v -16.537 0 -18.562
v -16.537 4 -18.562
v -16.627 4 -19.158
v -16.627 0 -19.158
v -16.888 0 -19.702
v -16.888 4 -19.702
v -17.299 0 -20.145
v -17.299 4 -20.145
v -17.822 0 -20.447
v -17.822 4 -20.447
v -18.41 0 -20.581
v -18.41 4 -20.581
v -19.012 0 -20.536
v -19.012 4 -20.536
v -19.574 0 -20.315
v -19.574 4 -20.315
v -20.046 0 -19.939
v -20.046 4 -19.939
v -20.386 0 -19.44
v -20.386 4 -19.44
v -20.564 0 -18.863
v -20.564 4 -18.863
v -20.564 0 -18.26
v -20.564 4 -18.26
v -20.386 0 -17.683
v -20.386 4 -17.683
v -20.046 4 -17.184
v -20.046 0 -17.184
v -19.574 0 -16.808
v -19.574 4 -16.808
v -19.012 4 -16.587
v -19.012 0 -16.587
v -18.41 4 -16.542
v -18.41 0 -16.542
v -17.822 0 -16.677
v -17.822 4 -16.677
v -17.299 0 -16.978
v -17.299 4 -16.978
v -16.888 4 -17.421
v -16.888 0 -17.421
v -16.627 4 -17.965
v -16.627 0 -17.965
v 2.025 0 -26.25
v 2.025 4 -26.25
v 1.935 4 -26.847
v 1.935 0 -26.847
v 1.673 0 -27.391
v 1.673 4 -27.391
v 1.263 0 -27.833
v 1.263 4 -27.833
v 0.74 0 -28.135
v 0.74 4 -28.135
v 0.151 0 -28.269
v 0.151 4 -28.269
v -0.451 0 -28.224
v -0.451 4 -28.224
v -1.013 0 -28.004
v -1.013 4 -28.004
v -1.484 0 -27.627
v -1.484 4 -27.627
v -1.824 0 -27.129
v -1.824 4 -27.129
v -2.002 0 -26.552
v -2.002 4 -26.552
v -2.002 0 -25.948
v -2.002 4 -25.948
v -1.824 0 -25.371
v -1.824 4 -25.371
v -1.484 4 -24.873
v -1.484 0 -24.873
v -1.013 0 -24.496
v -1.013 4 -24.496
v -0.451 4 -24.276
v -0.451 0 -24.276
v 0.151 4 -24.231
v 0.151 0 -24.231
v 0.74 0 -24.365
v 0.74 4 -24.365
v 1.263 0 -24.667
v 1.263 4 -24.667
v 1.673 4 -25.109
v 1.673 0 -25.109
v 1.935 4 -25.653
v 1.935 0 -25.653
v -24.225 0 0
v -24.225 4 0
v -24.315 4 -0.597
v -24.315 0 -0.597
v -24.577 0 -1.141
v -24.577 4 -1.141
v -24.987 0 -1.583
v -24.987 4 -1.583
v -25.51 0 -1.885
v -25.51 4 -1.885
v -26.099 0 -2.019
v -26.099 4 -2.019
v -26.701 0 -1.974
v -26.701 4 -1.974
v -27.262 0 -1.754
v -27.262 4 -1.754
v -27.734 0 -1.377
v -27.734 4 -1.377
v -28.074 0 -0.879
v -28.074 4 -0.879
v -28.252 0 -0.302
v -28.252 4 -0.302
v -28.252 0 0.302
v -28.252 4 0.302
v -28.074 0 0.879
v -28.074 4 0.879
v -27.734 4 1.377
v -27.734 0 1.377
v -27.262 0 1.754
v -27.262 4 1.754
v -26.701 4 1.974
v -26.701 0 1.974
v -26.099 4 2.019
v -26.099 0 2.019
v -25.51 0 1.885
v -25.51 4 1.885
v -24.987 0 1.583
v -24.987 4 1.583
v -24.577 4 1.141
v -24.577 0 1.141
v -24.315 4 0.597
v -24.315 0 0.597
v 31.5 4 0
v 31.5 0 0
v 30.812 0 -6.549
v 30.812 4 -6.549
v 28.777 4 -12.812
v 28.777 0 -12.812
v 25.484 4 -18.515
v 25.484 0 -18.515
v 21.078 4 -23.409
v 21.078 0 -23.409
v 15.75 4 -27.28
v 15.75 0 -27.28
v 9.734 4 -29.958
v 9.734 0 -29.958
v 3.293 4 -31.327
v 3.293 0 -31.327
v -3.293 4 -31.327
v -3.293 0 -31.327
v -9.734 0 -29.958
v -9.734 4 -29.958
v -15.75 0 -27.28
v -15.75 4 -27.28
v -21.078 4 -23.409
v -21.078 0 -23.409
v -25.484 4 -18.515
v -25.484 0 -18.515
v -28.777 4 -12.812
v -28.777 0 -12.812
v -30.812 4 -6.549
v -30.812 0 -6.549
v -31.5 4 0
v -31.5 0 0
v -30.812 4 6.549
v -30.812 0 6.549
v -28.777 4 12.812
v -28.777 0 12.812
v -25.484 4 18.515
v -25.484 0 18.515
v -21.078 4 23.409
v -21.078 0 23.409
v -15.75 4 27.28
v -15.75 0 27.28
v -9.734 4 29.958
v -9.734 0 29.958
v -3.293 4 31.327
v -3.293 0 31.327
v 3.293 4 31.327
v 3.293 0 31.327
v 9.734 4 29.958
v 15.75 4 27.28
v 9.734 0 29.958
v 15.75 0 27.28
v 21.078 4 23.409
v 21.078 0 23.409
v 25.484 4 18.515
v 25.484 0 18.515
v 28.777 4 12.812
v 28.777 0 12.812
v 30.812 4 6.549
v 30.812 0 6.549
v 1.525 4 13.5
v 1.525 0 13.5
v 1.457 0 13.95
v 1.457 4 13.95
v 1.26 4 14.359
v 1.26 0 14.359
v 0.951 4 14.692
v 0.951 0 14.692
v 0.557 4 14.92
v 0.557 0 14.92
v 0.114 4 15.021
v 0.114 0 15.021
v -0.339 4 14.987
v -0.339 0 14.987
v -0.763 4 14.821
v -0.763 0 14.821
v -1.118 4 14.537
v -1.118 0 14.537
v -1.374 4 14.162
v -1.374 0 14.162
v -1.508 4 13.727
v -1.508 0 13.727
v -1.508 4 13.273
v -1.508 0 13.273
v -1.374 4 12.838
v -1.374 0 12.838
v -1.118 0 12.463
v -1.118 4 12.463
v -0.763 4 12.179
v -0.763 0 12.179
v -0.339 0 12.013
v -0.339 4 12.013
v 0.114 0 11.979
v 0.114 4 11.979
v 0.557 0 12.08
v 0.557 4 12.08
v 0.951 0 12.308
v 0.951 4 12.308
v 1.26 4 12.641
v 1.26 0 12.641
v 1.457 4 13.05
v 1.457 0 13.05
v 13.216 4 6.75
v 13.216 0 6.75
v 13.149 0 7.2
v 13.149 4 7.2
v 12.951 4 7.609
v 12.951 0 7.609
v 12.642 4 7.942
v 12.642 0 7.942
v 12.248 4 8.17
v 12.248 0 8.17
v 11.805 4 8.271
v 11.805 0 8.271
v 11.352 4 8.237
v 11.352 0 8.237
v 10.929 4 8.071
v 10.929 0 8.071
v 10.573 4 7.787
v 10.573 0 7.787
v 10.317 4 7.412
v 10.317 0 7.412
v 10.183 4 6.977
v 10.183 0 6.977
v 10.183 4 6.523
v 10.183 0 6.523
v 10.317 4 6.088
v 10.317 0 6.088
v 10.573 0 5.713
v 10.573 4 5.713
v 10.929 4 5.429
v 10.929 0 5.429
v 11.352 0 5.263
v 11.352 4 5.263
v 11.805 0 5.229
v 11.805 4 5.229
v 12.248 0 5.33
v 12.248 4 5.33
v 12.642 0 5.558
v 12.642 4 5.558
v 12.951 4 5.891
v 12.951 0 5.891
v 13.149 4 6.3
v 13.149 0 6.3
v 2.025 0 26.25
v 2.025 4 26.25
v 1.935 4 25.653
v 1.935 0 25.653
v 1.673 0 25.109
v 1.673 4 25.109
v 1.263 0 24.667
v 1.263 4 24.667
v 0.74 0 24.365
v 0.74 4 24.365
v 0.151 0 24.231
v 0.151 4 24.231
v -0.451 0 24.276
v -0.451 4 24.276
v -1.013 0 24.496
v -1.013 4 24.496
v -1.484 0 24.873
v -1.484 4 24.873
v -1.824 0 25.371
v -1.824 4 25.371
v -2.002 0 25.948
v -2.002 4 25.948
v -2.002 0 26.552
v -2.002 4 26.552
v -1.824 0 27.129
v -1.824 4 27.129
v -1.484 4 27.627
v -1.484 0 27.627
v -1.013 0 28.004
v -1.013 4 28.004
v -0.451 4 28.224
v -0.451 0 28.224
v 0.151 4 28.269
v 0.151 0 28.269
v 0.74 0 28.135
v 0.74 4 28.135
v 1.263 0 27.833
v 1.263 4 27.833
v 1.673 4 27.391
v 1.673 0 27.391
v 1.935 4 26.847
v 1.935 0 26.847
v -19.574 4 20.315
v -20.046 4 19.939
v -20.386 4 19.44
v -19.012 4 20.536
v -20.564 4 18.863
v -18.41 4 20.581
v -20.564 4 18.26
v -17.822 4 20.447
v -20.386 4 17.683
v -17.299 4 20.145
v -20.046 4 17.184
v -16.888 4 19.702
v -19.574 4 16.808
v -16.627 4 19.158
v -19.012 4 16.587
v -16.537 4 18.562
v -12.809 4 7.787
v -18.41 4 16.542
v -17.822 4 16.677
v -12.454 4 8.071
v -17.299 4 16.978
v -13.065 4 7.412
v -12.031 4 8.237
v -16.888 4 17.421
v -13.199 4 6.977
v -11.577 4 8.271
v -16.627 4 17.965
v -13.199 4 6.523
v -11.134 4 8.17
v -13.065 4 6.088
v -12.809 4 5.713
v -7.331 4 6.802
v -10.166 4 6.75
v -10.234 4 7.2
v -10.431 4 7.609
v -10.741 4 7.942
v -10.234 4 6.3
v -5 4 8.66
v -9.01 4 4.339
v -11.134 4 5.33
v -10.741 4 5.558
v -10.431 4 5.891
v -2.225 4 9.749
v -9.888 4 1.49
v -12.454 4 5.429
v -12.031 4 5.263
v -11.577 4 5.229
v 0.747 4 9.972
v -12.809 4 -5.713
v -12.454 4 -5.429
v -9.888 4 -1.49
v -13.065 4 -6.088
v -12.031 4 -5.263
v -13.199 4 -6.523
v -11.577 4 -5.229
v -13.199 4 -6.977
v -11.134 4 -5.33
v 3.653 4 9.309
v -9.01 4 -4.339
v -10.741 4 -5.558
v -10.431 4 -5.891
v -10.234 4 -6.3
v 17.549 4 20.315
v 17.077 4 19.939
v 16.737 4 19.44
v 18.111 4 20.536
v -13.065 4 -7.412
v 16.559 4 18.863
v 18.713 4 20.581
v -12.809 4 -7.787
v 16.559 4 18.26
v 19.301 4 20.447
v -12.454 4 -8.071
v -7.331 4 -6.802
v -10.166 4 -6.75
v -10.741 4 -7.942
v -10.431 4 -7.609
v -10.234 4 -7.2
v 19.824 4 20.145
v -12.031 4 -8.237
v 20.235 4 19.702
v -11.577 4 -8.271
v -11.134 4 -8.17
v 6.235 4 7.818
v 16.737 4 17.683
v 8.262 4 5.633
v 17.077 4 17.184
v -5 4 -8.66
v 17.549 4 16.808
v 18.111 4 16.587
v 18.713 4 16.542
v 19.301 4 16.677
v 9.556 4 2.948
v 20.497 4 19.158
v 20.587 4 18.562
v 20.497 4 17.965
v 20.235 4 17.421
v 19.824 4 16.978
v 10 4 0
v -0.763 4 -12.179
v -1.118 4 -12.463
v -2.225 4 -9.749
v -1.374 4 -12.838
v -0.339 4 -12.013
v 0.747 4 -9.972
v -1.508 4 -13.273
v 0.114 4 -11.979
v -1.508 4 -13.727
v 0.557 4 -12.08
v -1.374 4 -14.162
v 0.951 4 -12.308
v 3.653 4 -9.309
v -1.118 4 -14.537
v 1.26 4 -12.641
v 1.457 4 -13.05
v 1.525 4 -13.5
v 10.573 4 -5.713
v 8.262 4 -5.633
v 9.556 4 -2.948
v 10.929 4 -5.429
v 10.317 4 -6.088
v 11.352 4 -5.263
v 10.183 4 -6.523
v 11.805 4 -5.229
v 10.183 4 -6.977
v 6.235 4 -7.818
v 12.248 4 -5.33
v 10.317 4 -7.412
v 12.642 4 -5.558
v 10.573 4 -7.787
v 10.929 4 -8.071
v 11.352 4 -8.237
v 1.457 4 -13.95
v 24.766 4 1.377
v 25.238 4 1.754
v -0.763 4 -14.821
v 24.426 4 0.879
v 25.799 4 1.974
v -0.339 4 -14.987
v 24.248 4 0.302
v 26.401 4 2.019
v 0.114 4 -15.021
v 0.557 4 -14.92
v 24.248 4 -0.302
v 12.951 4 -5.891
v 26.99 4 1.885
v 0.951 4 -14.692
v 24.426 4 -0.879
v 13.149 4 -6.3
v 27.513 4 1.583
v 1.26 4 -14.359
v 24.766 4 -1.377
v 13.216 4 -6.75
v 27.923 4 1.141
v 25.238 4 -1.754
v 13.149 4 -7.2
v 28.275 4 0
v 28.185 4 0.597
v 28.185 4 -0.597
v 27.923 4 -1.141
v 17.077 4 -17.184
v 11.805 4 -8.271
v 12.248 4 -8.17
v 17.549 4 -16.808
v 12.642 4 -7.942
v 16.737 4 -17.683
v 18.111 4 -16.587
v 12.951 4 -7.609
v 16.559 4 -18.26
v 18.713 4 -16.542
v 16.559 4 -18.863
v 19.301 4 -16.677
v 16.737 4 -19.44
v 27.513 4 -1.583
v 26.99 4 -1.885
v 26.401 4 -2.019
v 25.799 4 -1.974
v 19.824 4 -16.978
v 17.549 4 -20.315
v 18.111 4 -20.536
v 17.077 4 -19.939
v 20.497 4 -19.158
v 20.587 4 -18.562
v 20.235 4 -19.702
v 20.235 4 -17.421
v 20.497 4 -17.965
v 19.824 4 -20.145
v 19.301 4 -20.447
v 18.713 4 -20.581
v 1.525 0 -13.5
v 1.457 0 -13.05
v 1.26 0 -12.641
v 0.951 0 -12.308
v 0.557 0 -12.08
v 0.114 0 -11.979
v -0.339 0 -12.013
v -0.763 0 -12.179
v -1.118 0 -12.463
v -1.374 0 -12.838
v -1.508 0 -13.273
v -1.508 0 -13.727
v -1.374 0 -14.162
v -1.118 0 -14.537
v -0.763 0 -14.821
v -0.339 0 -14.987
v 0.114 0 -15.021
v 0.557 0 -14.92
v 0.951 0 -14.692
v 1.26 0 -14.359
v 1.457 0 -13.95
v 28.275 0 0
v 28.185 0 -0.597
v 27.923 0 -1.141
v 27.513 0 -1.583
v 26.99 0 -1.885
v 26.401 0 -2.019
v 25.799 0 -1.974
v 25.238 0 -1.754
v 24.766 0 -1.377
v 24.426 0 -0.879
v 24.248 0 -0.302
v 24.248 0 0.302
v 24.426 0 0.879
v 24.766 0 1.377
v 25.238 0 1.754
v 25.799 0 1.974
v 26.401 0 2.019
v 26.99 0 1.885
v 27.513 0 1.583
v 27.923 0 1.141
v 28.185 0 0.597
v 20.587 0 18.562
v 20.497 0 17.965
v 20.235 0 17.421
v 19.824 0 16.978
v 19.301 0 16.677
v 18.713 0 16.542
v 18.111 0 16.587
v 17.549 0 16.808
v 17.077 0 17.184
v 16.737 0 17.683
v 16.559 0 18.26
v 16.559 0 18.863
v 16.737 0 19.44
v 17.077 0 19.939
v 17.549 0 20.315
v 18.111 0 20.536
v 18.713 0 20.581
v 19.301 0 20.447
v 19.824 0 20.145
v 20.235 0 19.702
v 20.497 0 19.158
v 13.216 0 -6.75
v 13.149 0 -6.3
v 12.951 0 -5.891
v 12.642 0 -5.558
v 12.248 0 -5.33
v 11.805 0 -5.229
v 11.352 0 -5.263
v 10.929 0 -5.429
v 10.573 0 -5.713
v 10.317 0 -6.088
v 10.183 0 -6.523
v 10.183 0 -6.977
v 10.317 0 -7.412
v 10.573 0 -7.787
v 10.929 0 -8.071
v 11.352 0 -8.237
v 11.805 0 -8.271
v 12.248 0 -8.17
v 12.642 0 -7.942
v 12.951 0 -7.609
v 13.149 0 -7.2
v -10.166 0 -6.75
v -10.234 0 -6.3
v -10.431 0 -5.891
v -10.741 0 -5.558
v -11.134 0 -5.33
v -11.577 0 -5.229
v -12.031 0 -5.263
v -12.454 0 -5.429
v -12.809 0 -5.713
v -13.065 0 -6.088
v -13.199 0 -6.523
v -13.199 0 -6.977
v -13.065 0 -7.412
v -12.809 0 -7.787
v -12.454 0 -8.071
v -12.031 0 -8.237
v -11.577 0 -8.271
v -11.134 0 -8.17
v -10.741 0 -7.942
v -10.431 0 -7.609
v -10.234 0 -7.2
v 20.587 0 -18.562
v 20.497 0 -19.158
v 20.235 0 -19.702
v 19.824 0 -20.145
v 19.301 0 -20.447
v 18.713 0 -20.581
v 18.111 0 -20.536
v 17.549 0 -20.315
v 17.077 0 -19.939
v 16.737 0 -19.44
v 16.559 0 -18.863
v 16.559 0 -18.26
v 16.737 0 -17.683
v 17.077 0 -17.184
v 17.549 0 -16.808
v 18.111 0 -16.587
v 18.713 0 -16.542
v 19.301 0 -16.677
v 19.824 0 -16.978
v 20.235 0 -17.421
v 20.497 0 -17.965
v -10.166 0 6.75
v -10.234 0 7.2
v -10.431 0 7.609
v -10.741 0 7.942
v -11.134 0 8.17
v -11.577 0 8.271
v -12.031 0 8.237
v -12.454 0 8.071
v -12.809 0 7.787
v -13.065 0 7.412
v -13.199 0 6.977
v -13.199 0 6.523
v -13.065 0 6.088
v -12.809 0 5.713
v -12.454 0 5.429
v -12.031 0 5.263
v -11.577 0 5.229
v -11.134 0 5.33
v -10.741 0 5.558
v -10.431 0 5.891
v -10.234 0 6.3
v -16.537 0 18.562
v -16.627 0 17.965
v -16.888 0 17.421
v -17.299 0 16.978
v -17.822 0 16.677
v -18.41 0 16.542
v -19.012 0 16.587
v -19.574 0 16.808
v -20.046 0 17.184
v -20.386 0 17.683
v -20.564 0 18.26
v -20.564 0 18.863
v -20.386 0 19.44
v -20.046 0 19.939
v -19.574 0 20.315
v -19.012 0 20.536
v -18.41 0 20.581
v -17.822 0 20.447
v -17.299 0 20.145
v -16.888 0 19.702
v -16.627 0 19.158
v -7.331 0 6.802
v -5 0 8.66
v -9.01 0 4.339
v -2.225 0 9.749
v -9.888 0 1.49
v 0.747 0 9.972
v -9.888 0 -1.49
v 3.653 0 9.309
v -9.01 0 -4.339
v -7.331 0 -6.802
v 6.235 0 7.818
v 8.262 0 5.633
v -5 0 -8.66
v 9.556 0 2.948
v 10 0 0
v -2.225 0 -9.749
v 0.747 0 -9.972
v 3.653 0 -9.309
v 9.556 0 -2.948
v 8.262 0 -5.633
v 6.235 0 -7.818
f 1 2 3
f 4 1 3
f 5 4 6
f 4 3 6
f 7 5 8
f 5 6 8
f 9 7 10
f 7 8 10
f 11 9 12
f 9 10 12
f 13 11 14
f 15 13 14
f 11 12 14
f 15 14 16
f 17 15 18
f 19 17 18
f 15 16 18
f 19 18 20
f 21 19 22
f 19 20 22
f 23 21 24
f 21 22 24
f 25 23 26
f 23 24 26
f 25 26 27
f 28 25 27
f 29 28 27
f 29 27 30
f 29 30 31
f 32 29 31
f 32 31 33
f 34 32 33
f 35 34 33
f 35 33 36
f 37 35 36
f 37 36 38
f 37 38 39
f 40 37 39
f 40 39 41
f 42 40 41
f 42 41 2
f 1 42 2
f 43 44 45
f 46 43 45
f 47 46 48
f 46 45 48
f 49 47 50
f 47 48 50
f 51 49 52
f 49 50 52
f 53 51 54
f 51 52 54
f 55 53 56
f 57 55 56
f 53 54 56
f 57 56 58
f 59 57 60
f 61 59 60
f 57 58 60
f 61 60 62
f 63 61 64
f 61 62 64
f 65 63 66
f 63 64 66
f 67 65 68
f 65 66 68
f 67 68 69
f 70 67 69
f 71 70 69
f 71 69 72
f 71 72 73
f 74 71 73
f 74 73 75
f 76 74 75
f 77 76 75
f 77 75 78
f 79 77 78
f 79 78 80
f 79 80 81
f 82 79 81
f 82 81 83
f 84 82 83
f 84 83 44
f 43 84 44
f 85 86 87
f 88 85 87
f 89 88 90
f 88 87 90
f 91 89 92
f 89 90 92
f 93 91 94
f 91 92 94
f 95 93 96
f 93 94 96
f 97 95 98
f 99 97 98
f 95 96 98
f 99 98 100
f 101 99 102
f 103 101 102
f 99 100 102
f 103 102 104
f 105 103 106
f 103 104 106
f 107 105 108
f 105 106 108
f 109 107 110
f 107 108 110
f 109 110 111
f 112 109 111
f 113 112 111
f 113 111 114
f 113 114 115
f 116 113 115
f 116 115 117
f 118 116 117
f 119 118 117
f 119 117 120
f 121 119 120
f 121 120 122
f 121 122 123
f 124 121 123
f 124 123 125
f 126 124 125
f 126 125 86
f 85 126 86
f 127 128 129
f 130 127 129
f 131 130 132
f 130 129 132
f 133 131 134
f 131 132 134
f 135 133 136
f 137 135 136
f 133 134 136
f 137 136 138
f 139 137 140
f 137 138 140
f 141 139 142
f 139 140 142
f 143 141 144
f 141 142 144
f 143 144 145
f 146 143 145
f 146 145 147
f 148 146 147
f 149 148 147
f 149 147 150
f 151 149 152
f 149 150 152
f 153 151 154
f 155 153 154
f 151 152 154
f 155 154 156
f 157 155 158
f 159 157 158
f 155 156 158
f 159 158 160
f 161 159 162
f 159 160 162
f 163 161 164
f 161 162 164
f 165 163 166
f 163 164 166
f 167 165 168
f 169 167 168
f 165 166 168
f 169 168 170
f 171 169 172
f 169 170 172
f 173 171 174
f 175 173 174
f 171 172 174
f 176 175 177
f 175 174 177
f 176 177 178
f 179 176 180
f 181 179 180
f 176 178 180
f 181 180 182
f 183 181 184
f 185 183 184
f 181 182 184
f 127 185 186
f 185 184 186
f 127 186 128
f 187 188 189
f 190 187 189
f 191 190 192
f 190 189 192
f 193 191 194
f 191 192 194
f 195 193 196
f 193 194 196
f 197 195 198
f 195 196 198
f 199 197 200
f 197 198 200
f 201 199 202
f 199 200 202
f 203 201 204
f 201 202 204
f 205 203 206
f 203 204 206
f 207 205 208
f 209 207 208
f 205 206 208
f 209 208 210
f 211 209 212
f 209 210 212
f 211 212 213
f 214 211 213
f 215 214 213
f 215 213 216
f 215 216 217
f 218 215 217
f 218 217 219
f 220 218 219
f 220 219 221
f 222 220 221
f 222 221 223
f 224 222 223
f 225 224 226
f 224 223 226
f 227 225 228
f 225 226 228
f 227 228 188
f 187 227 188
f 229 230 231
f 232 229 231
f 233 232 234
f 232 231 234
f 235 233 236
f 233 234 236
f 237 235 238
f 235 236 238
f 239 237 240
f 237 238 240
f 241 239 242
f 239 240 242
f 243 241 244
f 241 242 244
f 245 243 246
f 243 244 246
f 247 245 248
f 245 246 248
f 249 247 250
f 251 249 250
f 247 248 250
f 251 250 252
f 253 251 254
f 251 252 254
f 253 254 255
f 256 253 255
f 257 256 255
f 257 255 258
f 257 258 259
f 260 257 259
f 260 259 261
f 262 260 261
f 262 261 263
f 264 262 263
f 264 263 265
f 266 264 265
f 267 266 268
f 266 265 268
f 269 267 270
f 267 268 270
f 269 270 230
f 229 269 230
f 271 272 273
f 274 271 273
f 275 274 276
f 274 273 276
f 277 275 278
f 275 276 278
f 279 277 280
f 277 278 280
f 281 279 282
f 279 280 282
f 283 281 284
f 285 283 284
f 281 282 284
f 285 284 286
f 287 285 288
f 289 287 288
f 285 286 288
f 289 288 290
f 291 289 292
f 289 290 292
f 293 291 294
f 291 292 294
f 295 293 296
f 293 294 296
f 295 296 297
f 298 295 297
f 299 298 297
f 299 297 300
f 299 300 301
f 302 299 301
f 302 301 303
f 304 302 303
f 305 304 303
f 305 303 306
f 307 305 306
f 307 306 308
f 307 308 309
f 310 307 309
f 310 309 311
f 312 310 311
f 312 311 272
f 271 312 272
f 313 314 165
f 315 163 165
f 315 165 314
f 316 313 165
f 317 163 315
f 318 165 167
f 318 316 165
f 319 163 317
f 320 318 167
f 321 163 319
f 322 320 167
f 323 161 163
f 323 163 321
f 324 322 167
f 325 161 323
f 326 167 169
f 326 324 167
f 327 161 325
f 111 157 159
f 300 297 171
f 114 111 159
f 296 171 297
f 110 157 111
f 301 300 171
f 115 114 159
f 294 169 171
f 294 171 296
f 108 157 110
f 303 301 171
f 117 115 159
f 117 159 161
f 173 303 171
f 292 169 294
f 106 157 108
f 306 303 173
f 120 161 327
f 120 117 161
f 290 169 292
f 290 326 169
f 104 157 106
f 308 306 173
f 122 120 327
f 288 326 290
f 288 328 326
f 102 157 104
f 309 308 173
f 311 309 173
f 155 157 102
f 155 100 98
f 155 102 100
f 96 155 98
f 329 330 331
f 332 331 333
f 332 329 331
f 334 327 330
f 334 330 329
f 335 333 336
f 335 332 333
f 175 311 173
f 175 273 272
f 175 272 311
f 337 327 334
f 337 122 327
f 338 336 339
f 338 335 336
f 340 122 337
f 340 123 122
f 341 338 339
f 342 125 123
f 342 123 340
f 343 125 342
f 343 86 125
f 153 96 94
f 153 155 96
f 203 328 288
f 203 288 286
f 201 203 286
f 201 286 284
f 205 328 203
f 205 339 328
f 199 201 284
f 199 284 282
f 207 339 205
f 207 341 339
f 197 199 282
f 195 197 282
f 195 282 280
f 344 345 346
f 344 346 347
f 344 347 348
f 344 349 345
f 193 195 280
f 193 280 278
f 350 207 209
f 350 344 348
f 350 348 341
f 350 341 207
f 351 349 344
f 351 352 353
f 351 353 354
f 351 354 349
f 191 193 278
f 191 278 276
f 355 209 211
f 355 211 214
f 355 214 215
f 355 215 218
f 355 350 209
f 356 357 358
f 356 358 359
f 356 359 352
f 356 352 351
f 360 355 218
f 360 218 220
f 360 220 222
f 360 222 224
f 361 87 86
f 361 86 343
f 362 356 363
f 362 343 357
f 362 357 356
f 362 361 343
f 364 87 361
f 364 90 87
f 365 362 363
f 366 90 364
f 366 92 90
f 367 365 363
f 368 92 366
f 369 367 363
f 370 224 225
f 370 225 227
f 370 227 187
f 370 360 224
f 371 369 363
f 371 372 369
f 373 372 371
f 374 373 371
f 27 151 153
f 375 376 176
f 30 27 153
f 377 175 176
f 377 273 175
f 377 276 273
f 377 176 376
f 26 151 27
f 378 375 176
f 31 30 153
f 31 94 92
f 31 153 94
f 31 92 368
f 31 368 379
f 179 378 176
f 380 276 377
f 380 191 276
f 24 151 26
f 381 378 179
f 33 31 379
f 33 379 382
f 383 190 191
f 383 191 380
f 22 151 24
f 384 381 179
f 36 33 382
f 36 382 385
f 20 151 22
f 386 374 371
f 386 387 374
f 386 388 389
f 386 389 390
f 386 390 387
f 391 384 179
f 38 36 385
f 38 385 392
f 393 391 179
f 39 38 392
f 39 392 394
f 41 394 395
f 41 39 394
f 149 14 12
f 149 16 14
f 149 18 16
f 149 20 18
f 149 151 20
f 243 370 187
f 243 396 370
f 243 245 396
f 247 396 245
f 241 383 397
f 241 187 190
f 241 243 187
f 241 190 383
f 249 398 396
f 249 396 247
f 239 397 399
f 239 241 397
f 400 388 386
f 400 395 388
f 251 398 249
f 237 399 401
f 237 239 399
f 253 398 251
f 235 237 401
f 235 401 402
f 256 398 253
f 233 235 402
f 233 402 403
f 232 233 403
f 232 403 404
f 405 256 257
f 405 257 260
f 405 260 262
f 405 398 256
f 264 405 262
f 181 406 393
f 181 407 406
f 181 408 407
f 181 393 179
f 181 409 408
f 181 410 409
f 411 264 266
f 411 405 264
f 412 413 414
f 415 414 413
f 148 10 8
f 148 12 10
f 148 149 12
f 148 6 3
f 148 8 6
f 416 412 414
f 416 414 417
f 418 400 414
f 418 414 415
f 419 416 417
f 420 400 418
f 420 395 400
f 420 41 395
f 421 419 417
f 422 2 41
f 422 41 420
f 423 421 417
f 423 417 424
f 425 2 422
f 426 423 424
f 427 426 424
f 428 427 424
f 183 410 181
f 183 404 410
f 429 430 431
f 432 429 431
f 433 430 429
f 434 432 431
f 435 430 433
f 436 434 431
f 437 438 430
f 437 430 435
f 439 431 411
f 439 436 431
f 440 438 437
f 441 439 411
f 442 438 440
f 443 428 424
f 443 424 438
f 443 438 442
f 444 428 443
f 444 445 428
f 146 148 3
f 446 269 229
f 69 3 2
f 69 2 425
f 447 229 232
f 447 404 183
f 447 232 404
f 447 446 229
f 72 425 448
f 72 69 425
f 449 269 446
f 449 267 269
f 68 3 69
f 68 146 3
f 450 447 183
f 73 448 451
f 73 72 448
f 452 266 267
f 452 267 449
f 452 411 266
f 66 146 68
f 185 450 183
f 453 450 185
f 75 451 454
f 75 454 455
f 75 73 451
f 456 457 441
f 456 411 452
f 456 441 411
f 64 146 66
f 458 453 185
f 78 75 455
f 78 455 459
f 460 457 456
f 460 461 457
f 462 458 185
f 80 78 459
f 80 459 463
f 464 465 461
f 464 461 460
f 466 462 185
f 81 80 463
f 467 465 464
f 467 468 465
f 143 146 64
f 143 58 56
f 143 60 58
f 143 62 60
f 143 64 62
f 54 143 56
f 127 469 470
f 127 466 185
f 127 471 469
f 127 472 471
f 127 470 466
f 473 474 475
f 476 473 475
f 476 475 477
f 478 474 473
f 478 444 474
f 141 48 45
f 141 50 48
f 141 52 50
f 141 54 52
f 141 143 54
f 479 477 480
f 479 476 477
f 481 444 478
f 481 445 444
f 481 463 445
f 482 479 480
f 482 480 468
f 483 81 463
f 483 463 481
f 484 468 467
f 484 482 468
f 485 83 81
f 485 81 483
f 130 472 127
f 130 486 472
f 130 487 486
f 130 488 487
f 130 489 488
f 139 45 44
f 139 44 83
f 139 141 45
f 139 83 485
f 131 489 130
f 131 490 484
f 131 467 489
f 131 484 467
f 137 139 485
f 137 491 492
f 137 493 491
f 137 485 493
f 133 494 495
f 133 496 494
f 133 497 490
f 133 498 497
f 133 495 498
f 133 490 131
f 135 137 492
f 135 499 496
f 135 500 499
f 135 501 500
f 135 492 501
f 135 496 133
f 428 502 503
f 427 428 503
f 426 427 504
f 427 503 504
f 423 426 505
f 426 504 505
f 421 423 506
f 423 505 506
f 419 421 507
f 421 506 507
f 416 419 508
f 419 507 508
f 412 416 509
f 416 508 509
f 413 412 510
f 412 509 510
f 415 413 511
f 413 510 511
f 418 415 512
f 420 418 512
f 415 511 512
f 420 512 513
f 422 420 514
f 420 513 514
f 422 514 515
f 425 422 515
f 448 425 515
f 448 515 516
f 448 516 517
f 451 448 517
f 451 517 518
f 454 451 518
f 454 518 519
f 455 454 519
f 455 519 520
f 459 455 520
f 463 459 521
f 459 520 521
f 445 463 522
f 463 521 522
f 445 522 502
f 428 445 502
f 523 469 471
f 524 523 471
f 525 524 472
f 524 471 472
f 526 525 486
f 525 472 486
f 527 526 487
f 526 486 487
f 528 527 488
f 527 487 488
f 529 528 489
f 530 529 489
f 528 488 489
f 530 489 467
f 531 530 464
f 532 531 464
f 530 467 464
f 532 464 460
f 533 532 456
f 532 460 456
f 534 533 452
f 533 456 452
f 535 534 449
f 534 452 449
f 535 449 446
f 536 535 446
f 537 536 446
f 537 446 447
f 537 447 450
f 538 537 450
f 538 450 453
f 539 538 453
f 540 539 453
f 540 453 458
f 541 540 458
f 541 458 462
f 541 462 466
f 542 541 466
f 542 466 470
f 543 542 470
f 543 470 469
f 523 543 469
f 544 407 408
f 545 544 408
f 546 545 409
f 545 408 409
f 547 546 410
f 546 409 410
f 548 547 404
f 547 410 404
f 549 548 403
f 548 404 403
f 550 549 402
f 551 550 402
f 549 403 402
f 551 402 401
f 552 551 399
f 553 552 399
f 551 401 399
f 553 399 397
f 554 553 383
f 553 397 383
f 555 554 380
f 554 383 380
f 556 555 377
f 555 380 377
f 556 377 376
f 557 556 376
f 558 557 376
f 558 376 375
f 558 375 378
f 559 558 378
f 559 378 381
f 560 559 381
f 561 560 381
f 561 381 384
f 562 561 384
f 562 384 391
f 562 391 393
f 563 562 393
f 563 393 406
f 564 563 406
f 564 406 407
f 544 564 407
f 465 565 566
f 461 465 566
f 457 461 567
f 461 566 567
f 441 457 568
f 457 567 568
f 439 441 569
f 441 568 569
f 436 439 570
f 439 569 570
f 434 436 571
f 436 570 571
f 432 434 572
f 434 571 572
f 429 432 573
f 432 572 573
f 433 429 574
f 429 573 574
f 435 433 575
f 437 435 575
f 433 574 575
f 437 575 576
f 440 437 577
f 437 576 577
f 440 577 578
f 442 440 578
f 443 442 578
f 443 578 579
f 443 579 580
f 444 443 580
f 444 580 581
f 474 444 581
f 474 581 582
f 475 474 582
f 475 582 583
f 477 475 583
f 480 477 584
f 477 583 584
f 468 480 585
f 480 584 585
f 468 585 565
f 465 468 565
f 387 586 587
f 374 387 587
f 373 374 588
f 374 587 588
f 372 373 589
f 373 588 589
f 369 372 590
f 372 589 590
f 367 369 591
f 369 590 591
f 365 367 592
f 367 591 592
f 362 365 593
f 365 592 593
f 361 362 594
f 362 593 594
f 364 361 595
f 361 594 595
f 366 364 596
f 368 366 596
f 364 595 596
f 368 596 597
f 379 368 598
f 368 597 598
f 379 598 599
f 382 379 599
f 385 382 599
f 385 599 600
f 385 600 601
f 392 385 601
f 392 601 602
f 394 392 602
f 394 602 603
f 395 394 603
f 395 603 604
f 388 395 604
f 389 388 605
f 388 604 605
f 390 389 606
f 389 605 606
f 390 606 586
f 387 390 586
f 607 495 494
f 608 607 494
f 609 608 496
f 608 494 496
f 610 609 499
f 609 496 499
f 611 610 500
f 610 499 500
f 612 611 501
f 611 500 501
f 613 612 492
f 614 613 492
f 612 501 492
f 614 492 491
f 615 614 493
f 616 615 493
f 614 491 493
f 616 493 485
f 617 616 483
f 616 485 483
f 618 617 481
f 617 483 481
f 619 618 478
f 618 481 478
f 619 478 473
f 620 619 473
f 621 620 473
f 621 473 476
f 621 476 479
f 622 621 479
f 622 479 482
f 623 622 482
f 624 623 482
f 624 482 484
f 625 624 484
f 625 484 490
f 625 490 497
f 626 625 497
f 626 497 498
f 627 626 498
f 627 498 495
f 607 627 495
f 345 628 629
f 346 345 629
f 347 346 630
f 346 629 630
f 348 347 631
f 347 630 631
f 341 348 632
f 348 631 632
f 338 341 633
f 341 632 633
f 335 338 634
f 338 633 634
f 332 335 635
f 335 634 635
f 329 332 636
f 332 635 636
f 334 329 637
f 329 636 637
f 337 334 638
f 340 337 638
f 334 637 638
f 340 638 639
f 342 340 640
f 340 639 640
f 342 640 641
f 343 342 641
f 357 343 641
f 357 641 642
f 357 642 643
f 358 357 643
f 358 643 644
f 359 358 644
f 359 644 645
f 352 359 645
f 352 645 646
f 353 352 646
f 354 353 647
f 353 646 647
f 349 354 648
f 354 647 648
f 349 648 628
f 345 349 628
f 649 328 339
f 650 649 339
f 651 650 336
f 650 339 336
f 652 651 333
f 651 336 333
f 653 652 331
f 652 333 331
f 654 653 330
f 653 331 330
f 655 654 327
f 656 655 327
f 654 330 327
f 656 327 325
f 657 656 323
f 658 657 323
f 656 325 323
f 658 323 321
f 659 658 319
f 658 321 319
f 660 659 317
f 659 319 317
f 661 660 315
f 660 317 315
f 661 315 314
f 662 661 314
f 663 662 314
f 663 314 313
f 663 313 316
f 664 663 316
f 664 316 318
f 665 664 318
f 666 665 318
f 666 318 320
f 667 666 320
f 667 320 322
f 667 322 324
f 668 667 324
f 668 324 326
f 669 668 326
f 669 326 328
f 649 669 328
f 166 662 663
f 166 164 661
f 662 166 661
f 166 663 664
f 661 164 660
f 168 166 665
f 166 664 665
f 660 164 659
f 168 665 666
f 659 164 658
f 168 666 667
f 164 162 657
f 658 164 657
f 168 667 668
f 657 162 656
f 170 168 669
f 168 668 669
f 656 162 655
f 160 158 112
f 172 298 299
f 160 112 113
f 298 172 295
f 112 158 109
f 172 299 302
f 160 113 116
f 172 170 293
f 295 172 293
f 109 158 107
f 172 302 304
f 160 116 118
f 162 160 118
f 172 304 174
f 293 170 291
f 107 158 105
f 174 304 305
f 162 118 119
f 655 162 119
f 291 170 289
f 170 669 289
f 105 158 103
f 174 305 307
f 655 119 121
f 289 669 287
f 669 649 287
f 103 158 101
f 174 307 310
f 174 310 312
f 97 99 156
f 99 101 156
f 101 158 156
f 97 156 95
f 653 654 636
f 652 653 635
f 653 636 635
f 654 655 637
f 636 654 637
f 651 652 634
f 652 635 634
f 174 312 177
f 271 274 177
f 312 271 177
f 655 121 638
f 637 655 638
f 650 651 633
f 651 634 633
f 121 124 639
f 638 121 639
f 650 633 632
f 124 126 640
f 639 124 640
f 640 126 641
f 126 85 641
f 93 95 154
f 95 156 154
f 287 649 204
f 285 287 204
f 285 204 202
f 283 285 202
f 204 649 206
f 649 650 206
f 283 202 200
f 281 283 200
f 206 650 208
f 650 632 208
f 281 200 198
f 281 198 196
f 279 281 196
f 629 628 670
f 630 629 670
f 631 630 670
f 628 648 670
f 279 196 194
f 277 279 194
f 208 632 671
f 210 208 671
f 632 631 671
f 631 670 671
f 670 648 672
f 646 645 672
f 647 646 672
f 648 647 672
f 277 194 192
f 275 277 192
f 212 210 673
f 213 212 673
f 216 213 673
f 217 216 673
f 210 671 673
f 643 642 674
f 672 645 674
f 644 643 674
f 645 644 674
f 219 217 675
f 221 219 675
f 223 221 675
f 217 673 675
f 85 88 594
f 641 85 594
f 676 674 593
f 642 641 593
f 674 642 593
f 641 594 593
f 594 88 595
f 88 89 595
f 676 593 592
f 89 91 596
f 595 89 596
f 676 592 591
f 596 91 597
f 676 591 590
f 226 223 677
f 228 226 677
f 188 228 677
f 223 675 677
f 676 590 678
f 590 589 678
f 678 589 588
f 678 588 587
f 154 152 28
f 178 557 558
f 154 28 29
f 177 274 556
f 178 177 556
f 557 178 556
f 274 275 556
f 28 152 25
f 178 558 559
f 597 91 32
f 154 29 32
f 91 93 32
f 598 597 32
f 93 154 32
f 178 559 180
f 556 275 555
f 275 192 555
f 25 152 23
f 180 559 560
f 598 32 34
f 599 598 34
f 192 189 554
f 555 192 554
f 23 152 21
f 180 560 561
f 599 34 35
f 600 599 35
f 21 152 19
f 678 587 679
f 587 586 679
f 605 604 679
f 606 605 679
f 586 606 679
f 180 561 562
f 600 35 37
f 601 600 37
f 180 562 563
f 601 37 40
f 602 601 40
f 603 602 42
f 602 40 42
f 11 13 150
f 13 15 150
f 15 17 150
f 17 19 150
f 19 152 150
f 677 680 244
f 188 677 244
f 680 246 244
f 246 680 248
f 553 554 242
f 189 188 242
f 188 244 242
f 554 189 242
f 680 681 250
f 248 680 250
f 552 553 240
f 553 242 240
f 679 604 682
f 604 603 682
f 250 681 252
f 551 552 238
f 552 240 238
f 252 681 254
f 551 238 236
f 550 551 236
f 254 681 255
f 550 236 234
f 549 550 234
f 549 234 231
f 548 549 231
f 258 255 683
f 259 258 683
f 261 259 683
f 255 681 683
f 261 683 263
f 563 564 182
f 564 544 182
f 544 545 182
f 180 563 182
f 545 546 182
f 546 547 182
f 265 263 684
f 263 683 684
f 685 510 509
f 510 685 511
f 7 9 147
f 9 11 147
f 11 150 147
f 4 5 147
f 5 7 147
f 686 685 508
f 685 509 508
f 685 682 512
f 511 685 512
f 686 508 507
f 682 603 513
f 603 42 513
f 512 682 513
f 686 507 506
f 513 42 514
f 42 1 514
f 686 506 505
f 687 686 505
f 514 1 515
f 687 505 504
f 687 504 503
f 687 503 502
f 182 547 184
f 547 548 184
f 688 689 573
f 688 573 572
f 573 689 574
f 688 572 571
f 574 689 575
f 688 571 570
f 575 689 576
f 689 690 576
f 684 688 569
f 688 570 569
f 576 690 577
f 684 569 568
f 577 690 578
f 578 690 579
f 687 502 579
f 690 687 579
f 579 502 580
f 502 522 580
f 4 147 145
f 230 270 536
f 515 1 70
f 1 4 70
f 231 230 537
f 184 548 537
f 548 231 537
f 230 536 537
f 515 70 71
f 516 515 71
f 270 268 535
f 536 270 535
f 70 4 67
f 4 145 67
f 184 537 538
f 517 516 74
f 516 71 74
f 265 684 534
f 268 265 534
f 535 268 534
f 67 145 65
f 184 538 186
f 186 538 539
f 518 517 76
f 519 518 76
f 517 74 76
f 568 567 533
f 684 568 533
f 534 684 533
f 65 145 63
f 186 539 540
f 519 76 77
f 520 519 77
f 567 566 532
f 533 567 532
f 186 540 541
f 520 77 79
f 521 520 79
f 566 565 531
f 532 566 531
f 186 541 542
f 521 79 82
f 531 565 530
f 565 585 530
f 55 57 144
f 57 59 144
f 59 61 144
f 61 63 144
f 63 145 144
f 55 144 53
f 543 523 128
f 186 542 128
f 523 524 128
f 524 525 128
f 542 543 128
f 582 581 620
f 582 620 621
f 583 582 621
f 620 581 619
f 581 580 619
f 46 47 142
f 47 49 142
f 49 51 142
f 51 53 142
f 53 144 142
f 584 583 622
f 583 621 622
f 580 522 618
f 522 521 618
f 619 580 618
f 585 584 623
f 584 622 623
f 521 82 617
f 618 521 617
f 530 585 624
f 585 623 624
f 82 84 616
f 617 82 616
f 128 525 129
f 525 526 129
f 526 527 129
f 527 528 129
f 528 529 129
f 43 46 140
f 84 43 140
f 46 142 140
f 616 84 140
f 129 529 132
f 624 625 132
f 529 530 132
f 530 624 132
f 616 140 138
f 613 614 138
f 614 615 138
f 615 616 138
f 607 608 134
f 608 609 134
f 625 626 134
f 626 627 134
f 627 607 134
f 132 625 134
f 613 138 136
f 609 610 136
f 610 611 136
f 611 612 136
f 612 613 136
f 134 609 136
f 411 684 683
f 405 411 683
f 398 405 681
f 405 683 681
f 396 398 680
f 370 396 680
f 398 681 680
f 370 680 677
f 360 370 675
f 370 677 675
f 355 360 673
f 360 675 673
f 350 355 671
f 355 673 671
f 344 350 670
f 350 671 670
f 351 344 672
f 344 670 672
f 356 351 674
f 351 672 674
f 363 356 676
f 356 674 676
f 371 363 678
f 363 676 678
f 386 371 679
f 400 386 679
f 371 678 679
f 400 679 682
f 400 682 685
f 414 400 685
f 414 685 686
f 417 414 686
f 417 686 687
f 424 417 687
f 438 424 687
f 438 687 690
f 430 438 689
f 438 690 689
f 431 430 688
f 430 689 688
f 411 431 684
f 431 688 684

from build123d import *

# Parameters (mm, degrees)
SKETCH_1_R               = 31.5
SKETCH_1_R_2             = 22.5
EXTRUDE_1_DEPTH          = 4
SKETCH_2_R               = 2.025
CUT_EXTRUDE_1_DEPTH      = 1
CUT_EXTRUDE_1_DEPTH_BACK = 5
SKETCH_3_R               = 22.5
EXTRUDE_2_DEPTH          = 4
SKETCH_4_R               = 1.525
CUT_EXTRUDE_2_DEPTH      = 4
SKETCH_5_R               = 10
CUT_EXTRUDE_3_DEPTH      = 4


with BuildPart() as part:
    # 草图1 → 凸台-拉伸1 (new body)
    with BuildSketch(Plane(origin=(0, 0, 0), x_dir=(1, 0, 0), z_dir=(0, 1, 0))):
        Circle(SKETCH_1_R)
        Circle(SKETCH_1_R_2, mode=Mode.SUBTRACT)
    extrude(amount=EXTRUDE_1_DEPTH)

    # 草图2 → 切除-拉伸1 (cut, two sides)
    with BuildSketch(Plane(origin=(0, 4, 0), x_dir=(1, 0, 0), z_dir=(0, 1, 0))) as cut_extrude_1_sk:
        with Locations((0, 26.25)):
            Circle(SKETCH_2_R)
        with Locations((18.561553006, 18.561553006)):
            Circle(SKETCH_2_R)
        with Locations((26.25, 0)):
            Circle(SKETCH_2_R)
        with Locations((18.561553006, -18.561553006)):
            Circle(SKETCH_2_R)
        with Locations((0, -26.25)):
            Circle(SKETCH_2_R)
        with Locations((-18.561553006, -18.561553006)):
            Circle(SKETCH_2_R)
        with Locations((-26.25, 0)):
            Circle(SKETCH_2_R)
        with Locations((-18.561553006, 18.561553006)):
            Circle(SKETCH_2_R)
    extrude(amount=CUT_EXTRUDE_1_DEPTH, mode=Mode.SUBTRACT)
    extrude(cut_extrude_1_sk.sketch, amount=-CUT_EXTRUDE_1_DEPTH_BACK, mode=Mode.SUBTRACT)

    # 草图3 → 凸台-拉伸2 (add)
    with BuildSketch(Plane(origin=(0, 4, 0), x_dir=(1, 0, 0), z_dir=(0, 1, 0))):
        Circle(SKETCH_3_R)
    extrude(amount=-EXTRUDE_2_DEPTH)

    # 草图4 → 切除-拉伸2 (cut)
    with BuildSketch(Plane.XZ):
        with Locations((0, 13.5)):
            Circle(SKETCH_4_R)
        with Locations((11.691342951, 6.75)):
            Circle(SKETCH_4_R)
        with Locations((11.691342951, -6.75)):
            Circle(SKETCH_4_R)
        with Locations((0, -13.5)):
            Circle(SKETCH_4_R)
        with Locations((-11.691342951, -6.75)):
            Circle(SKETCH_4_R)
        with Locations((-11.691342951, 6.75)):
            Circle(SKETCH_4_R)
    extrude(amount=-CUT_EXTRUDE_2_DEPTH, mode=Mode.SUBTRACT)

    # 草图5 → 切除-拉伸3 (cut)
    with BuildSketch(Plane.XZ):
        Circle(SKETCH_5_R)
    extrude(amount=-CUT_EXTRUDE_3_DEPTH, mode=Mode.SUBTRACT)


solid = part.part
